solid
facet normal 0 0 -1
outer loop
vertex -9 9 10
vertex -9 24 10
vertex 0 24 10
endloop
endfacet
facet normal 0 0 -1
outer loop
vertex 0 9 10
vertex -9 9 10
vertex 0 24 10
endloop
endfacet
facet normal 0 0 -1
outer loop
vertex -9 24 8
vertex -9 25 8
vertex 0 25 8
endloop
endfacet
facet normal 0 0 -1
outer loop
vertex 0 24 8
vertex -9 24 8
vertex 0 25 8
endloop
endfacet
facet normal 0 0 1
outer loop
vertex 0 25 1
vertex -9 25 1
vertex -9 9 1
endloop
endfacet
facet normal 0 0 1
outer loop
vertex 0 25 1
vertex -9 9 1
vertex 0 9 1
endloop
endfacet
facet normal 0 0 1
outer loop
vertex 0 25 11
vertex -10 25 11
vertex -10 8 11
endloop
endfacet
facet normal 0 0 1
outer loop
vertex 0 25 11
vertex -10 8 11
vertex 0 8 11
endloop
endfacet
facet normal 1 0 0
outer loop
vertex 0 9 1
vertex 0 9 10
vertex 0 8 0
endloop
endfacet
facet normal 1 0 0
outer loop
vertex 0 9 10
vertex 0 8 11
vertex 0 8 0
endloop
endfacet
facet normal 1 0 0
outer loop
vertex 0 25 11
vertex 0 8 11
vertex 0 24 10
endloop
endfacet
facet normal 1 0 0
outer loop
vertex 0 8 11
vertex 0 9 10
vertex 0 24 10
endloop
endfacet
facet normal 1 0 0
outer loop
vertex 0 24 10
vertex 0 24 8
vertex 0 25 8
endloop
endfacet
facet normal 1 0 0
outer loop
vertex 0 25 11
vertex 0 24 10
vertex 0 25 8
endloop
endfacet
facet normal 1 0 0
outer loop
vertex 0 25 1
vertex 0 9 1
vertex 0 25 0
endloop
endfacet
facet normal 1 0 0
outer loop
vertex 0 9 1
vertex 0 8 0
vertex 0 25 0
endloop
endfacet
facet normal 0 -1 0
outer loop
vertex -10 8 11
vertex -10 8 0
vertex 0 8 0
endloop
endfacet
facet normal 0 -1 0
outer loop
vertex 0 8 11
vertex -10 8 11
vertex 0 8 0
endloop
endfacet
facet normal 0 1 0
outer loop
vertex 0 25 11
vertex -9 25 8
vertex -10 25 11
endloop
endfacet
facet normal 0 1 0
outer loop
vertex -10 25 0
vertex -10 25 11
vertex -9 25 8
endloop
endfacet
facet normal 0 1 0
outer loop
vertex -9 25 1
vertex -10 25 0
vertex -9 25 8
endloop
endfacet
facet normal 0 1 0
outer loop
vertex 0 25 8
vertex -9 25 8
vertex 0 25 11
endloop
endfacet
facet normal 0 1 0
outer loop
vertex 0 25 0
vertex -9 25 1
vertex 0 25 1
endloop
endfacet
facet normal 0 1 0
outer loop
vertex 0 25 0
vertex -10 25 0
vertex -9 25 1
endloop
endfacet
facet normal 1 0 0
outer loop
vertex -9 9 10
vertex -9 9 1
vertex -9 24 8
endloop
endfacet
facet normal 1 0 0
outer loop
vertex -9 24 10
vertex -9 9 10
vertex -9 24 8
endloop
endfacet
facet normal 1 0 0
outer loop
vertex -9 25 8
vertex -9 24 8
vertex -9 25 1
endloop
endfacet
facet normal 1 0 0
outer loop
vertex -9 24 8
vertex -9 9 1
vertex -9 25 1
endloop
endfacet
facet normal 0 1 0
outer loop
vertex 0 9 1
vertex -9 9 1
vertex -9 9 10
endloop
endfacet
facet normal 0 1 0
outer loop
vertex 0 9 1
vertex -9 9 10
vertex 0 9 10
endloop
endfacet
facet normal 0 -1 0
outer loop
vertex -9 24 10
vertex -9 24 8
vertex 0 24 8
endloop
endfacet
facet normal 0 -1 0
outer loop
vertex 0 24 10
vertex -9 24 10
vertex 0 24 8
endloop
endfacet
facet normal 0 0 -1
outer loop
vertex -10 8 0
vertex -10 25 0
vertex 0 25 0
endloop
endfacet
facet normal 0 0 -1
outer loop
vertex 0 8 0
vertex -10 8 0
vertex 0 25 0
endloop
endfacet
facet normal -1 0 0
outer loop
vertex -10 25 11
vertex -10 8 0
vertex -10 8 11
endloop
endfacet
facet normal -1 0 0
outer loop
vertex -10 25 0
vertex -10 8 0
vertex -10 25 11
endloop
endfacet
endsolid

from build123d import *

# Parameters (mm, degrees)
BOX052_W     = 10
BOX052_H     = 17
BOX052_DEPTH = 1
BOX024_W     = 9
BOX024_H     = 1
BOX024_DEPTH = 2
BOX022_W     = 1
BOX022_H     = 16
BOX022_DEPTH = 9
BOX021_W     = 10
BOX021_H     = 1
BOX021_DEPTH = 9
BOX025_W     = 10
BOX025_H     = 17
BOX025_DEPTH = 1


with BuildPart() as box052:
    # Box052 → Box052 (new body)
    with BuildSketch(Plane(origin=(-10, 8, 0), x_dir=(1, 0, 0), z_dir=(0, 0, 1))):
        with Locations((5, 8.5)):
            Rectangle(BOX052_W, BOX052_H)
    extrude(amount=BOX052_DEPTH)


with BuildPart() as box024:
    # Box024 → Box024 (new body)
    with BuildSketch(Plane(origin=(-9, 24, 7), x_dir=(1, 0, 0), z_dir=(0, 0, 1))):
        with Locations((4.5, 0.5)):
            Rectangle(BOX024_W, BOX024_H)
    extrude(amount=BOX024_DEPTH)


with BuildPart() as box022:
    # Box022 → Box022 (new body)
    with BuildSketch(Plane(origin=(-10, 9, 0), x_dir=(1, 0, 0), z_dir=(0, 0, 1))):
        with Locations((0.5, 8)):
            Rectangle(BOX022_W, BOX022_H)
    extrude(amount=BOX022_DEPTH)


with BuildPart() as box021:
    # Box021 → Box021 (new body)
    with BuildSketch(Plane(origin=(-10, 8, 0), x_dir=(1, 0, 0), z_dir=(0, 0, 1))):
        with Locations((5, 0.5)):
            Rectangle(BOX021_W, BOX021_H)
    extrude(amount=BOX021_DEPTH)


with BuildPart() as fusion024:
    # Box025 → Box025 (new body)
    with BuildSketch(Plane(origin=(-10, 8, 9), x_dir=(1, 0, 0), z_dir=(0, 0, 1))):
        with Locations((5, 8.5)):
            Rectangle(BOX025_W, BOX025_H)
    extrude(amount=BOX025_DEPTH)

    # Fusion010: union Box024, Box022, Box021
    add(box024.part)
    add(box022.part)
    add(box021.part)


with BuildPart() as fusion024_1:
    # Fusion010 placement: moved
    add(fusion024.part.moved(Location((0, 0, 1))))

    # Fusion024: union Box052
    add(box052.part)


solid = fusion024_1.part
